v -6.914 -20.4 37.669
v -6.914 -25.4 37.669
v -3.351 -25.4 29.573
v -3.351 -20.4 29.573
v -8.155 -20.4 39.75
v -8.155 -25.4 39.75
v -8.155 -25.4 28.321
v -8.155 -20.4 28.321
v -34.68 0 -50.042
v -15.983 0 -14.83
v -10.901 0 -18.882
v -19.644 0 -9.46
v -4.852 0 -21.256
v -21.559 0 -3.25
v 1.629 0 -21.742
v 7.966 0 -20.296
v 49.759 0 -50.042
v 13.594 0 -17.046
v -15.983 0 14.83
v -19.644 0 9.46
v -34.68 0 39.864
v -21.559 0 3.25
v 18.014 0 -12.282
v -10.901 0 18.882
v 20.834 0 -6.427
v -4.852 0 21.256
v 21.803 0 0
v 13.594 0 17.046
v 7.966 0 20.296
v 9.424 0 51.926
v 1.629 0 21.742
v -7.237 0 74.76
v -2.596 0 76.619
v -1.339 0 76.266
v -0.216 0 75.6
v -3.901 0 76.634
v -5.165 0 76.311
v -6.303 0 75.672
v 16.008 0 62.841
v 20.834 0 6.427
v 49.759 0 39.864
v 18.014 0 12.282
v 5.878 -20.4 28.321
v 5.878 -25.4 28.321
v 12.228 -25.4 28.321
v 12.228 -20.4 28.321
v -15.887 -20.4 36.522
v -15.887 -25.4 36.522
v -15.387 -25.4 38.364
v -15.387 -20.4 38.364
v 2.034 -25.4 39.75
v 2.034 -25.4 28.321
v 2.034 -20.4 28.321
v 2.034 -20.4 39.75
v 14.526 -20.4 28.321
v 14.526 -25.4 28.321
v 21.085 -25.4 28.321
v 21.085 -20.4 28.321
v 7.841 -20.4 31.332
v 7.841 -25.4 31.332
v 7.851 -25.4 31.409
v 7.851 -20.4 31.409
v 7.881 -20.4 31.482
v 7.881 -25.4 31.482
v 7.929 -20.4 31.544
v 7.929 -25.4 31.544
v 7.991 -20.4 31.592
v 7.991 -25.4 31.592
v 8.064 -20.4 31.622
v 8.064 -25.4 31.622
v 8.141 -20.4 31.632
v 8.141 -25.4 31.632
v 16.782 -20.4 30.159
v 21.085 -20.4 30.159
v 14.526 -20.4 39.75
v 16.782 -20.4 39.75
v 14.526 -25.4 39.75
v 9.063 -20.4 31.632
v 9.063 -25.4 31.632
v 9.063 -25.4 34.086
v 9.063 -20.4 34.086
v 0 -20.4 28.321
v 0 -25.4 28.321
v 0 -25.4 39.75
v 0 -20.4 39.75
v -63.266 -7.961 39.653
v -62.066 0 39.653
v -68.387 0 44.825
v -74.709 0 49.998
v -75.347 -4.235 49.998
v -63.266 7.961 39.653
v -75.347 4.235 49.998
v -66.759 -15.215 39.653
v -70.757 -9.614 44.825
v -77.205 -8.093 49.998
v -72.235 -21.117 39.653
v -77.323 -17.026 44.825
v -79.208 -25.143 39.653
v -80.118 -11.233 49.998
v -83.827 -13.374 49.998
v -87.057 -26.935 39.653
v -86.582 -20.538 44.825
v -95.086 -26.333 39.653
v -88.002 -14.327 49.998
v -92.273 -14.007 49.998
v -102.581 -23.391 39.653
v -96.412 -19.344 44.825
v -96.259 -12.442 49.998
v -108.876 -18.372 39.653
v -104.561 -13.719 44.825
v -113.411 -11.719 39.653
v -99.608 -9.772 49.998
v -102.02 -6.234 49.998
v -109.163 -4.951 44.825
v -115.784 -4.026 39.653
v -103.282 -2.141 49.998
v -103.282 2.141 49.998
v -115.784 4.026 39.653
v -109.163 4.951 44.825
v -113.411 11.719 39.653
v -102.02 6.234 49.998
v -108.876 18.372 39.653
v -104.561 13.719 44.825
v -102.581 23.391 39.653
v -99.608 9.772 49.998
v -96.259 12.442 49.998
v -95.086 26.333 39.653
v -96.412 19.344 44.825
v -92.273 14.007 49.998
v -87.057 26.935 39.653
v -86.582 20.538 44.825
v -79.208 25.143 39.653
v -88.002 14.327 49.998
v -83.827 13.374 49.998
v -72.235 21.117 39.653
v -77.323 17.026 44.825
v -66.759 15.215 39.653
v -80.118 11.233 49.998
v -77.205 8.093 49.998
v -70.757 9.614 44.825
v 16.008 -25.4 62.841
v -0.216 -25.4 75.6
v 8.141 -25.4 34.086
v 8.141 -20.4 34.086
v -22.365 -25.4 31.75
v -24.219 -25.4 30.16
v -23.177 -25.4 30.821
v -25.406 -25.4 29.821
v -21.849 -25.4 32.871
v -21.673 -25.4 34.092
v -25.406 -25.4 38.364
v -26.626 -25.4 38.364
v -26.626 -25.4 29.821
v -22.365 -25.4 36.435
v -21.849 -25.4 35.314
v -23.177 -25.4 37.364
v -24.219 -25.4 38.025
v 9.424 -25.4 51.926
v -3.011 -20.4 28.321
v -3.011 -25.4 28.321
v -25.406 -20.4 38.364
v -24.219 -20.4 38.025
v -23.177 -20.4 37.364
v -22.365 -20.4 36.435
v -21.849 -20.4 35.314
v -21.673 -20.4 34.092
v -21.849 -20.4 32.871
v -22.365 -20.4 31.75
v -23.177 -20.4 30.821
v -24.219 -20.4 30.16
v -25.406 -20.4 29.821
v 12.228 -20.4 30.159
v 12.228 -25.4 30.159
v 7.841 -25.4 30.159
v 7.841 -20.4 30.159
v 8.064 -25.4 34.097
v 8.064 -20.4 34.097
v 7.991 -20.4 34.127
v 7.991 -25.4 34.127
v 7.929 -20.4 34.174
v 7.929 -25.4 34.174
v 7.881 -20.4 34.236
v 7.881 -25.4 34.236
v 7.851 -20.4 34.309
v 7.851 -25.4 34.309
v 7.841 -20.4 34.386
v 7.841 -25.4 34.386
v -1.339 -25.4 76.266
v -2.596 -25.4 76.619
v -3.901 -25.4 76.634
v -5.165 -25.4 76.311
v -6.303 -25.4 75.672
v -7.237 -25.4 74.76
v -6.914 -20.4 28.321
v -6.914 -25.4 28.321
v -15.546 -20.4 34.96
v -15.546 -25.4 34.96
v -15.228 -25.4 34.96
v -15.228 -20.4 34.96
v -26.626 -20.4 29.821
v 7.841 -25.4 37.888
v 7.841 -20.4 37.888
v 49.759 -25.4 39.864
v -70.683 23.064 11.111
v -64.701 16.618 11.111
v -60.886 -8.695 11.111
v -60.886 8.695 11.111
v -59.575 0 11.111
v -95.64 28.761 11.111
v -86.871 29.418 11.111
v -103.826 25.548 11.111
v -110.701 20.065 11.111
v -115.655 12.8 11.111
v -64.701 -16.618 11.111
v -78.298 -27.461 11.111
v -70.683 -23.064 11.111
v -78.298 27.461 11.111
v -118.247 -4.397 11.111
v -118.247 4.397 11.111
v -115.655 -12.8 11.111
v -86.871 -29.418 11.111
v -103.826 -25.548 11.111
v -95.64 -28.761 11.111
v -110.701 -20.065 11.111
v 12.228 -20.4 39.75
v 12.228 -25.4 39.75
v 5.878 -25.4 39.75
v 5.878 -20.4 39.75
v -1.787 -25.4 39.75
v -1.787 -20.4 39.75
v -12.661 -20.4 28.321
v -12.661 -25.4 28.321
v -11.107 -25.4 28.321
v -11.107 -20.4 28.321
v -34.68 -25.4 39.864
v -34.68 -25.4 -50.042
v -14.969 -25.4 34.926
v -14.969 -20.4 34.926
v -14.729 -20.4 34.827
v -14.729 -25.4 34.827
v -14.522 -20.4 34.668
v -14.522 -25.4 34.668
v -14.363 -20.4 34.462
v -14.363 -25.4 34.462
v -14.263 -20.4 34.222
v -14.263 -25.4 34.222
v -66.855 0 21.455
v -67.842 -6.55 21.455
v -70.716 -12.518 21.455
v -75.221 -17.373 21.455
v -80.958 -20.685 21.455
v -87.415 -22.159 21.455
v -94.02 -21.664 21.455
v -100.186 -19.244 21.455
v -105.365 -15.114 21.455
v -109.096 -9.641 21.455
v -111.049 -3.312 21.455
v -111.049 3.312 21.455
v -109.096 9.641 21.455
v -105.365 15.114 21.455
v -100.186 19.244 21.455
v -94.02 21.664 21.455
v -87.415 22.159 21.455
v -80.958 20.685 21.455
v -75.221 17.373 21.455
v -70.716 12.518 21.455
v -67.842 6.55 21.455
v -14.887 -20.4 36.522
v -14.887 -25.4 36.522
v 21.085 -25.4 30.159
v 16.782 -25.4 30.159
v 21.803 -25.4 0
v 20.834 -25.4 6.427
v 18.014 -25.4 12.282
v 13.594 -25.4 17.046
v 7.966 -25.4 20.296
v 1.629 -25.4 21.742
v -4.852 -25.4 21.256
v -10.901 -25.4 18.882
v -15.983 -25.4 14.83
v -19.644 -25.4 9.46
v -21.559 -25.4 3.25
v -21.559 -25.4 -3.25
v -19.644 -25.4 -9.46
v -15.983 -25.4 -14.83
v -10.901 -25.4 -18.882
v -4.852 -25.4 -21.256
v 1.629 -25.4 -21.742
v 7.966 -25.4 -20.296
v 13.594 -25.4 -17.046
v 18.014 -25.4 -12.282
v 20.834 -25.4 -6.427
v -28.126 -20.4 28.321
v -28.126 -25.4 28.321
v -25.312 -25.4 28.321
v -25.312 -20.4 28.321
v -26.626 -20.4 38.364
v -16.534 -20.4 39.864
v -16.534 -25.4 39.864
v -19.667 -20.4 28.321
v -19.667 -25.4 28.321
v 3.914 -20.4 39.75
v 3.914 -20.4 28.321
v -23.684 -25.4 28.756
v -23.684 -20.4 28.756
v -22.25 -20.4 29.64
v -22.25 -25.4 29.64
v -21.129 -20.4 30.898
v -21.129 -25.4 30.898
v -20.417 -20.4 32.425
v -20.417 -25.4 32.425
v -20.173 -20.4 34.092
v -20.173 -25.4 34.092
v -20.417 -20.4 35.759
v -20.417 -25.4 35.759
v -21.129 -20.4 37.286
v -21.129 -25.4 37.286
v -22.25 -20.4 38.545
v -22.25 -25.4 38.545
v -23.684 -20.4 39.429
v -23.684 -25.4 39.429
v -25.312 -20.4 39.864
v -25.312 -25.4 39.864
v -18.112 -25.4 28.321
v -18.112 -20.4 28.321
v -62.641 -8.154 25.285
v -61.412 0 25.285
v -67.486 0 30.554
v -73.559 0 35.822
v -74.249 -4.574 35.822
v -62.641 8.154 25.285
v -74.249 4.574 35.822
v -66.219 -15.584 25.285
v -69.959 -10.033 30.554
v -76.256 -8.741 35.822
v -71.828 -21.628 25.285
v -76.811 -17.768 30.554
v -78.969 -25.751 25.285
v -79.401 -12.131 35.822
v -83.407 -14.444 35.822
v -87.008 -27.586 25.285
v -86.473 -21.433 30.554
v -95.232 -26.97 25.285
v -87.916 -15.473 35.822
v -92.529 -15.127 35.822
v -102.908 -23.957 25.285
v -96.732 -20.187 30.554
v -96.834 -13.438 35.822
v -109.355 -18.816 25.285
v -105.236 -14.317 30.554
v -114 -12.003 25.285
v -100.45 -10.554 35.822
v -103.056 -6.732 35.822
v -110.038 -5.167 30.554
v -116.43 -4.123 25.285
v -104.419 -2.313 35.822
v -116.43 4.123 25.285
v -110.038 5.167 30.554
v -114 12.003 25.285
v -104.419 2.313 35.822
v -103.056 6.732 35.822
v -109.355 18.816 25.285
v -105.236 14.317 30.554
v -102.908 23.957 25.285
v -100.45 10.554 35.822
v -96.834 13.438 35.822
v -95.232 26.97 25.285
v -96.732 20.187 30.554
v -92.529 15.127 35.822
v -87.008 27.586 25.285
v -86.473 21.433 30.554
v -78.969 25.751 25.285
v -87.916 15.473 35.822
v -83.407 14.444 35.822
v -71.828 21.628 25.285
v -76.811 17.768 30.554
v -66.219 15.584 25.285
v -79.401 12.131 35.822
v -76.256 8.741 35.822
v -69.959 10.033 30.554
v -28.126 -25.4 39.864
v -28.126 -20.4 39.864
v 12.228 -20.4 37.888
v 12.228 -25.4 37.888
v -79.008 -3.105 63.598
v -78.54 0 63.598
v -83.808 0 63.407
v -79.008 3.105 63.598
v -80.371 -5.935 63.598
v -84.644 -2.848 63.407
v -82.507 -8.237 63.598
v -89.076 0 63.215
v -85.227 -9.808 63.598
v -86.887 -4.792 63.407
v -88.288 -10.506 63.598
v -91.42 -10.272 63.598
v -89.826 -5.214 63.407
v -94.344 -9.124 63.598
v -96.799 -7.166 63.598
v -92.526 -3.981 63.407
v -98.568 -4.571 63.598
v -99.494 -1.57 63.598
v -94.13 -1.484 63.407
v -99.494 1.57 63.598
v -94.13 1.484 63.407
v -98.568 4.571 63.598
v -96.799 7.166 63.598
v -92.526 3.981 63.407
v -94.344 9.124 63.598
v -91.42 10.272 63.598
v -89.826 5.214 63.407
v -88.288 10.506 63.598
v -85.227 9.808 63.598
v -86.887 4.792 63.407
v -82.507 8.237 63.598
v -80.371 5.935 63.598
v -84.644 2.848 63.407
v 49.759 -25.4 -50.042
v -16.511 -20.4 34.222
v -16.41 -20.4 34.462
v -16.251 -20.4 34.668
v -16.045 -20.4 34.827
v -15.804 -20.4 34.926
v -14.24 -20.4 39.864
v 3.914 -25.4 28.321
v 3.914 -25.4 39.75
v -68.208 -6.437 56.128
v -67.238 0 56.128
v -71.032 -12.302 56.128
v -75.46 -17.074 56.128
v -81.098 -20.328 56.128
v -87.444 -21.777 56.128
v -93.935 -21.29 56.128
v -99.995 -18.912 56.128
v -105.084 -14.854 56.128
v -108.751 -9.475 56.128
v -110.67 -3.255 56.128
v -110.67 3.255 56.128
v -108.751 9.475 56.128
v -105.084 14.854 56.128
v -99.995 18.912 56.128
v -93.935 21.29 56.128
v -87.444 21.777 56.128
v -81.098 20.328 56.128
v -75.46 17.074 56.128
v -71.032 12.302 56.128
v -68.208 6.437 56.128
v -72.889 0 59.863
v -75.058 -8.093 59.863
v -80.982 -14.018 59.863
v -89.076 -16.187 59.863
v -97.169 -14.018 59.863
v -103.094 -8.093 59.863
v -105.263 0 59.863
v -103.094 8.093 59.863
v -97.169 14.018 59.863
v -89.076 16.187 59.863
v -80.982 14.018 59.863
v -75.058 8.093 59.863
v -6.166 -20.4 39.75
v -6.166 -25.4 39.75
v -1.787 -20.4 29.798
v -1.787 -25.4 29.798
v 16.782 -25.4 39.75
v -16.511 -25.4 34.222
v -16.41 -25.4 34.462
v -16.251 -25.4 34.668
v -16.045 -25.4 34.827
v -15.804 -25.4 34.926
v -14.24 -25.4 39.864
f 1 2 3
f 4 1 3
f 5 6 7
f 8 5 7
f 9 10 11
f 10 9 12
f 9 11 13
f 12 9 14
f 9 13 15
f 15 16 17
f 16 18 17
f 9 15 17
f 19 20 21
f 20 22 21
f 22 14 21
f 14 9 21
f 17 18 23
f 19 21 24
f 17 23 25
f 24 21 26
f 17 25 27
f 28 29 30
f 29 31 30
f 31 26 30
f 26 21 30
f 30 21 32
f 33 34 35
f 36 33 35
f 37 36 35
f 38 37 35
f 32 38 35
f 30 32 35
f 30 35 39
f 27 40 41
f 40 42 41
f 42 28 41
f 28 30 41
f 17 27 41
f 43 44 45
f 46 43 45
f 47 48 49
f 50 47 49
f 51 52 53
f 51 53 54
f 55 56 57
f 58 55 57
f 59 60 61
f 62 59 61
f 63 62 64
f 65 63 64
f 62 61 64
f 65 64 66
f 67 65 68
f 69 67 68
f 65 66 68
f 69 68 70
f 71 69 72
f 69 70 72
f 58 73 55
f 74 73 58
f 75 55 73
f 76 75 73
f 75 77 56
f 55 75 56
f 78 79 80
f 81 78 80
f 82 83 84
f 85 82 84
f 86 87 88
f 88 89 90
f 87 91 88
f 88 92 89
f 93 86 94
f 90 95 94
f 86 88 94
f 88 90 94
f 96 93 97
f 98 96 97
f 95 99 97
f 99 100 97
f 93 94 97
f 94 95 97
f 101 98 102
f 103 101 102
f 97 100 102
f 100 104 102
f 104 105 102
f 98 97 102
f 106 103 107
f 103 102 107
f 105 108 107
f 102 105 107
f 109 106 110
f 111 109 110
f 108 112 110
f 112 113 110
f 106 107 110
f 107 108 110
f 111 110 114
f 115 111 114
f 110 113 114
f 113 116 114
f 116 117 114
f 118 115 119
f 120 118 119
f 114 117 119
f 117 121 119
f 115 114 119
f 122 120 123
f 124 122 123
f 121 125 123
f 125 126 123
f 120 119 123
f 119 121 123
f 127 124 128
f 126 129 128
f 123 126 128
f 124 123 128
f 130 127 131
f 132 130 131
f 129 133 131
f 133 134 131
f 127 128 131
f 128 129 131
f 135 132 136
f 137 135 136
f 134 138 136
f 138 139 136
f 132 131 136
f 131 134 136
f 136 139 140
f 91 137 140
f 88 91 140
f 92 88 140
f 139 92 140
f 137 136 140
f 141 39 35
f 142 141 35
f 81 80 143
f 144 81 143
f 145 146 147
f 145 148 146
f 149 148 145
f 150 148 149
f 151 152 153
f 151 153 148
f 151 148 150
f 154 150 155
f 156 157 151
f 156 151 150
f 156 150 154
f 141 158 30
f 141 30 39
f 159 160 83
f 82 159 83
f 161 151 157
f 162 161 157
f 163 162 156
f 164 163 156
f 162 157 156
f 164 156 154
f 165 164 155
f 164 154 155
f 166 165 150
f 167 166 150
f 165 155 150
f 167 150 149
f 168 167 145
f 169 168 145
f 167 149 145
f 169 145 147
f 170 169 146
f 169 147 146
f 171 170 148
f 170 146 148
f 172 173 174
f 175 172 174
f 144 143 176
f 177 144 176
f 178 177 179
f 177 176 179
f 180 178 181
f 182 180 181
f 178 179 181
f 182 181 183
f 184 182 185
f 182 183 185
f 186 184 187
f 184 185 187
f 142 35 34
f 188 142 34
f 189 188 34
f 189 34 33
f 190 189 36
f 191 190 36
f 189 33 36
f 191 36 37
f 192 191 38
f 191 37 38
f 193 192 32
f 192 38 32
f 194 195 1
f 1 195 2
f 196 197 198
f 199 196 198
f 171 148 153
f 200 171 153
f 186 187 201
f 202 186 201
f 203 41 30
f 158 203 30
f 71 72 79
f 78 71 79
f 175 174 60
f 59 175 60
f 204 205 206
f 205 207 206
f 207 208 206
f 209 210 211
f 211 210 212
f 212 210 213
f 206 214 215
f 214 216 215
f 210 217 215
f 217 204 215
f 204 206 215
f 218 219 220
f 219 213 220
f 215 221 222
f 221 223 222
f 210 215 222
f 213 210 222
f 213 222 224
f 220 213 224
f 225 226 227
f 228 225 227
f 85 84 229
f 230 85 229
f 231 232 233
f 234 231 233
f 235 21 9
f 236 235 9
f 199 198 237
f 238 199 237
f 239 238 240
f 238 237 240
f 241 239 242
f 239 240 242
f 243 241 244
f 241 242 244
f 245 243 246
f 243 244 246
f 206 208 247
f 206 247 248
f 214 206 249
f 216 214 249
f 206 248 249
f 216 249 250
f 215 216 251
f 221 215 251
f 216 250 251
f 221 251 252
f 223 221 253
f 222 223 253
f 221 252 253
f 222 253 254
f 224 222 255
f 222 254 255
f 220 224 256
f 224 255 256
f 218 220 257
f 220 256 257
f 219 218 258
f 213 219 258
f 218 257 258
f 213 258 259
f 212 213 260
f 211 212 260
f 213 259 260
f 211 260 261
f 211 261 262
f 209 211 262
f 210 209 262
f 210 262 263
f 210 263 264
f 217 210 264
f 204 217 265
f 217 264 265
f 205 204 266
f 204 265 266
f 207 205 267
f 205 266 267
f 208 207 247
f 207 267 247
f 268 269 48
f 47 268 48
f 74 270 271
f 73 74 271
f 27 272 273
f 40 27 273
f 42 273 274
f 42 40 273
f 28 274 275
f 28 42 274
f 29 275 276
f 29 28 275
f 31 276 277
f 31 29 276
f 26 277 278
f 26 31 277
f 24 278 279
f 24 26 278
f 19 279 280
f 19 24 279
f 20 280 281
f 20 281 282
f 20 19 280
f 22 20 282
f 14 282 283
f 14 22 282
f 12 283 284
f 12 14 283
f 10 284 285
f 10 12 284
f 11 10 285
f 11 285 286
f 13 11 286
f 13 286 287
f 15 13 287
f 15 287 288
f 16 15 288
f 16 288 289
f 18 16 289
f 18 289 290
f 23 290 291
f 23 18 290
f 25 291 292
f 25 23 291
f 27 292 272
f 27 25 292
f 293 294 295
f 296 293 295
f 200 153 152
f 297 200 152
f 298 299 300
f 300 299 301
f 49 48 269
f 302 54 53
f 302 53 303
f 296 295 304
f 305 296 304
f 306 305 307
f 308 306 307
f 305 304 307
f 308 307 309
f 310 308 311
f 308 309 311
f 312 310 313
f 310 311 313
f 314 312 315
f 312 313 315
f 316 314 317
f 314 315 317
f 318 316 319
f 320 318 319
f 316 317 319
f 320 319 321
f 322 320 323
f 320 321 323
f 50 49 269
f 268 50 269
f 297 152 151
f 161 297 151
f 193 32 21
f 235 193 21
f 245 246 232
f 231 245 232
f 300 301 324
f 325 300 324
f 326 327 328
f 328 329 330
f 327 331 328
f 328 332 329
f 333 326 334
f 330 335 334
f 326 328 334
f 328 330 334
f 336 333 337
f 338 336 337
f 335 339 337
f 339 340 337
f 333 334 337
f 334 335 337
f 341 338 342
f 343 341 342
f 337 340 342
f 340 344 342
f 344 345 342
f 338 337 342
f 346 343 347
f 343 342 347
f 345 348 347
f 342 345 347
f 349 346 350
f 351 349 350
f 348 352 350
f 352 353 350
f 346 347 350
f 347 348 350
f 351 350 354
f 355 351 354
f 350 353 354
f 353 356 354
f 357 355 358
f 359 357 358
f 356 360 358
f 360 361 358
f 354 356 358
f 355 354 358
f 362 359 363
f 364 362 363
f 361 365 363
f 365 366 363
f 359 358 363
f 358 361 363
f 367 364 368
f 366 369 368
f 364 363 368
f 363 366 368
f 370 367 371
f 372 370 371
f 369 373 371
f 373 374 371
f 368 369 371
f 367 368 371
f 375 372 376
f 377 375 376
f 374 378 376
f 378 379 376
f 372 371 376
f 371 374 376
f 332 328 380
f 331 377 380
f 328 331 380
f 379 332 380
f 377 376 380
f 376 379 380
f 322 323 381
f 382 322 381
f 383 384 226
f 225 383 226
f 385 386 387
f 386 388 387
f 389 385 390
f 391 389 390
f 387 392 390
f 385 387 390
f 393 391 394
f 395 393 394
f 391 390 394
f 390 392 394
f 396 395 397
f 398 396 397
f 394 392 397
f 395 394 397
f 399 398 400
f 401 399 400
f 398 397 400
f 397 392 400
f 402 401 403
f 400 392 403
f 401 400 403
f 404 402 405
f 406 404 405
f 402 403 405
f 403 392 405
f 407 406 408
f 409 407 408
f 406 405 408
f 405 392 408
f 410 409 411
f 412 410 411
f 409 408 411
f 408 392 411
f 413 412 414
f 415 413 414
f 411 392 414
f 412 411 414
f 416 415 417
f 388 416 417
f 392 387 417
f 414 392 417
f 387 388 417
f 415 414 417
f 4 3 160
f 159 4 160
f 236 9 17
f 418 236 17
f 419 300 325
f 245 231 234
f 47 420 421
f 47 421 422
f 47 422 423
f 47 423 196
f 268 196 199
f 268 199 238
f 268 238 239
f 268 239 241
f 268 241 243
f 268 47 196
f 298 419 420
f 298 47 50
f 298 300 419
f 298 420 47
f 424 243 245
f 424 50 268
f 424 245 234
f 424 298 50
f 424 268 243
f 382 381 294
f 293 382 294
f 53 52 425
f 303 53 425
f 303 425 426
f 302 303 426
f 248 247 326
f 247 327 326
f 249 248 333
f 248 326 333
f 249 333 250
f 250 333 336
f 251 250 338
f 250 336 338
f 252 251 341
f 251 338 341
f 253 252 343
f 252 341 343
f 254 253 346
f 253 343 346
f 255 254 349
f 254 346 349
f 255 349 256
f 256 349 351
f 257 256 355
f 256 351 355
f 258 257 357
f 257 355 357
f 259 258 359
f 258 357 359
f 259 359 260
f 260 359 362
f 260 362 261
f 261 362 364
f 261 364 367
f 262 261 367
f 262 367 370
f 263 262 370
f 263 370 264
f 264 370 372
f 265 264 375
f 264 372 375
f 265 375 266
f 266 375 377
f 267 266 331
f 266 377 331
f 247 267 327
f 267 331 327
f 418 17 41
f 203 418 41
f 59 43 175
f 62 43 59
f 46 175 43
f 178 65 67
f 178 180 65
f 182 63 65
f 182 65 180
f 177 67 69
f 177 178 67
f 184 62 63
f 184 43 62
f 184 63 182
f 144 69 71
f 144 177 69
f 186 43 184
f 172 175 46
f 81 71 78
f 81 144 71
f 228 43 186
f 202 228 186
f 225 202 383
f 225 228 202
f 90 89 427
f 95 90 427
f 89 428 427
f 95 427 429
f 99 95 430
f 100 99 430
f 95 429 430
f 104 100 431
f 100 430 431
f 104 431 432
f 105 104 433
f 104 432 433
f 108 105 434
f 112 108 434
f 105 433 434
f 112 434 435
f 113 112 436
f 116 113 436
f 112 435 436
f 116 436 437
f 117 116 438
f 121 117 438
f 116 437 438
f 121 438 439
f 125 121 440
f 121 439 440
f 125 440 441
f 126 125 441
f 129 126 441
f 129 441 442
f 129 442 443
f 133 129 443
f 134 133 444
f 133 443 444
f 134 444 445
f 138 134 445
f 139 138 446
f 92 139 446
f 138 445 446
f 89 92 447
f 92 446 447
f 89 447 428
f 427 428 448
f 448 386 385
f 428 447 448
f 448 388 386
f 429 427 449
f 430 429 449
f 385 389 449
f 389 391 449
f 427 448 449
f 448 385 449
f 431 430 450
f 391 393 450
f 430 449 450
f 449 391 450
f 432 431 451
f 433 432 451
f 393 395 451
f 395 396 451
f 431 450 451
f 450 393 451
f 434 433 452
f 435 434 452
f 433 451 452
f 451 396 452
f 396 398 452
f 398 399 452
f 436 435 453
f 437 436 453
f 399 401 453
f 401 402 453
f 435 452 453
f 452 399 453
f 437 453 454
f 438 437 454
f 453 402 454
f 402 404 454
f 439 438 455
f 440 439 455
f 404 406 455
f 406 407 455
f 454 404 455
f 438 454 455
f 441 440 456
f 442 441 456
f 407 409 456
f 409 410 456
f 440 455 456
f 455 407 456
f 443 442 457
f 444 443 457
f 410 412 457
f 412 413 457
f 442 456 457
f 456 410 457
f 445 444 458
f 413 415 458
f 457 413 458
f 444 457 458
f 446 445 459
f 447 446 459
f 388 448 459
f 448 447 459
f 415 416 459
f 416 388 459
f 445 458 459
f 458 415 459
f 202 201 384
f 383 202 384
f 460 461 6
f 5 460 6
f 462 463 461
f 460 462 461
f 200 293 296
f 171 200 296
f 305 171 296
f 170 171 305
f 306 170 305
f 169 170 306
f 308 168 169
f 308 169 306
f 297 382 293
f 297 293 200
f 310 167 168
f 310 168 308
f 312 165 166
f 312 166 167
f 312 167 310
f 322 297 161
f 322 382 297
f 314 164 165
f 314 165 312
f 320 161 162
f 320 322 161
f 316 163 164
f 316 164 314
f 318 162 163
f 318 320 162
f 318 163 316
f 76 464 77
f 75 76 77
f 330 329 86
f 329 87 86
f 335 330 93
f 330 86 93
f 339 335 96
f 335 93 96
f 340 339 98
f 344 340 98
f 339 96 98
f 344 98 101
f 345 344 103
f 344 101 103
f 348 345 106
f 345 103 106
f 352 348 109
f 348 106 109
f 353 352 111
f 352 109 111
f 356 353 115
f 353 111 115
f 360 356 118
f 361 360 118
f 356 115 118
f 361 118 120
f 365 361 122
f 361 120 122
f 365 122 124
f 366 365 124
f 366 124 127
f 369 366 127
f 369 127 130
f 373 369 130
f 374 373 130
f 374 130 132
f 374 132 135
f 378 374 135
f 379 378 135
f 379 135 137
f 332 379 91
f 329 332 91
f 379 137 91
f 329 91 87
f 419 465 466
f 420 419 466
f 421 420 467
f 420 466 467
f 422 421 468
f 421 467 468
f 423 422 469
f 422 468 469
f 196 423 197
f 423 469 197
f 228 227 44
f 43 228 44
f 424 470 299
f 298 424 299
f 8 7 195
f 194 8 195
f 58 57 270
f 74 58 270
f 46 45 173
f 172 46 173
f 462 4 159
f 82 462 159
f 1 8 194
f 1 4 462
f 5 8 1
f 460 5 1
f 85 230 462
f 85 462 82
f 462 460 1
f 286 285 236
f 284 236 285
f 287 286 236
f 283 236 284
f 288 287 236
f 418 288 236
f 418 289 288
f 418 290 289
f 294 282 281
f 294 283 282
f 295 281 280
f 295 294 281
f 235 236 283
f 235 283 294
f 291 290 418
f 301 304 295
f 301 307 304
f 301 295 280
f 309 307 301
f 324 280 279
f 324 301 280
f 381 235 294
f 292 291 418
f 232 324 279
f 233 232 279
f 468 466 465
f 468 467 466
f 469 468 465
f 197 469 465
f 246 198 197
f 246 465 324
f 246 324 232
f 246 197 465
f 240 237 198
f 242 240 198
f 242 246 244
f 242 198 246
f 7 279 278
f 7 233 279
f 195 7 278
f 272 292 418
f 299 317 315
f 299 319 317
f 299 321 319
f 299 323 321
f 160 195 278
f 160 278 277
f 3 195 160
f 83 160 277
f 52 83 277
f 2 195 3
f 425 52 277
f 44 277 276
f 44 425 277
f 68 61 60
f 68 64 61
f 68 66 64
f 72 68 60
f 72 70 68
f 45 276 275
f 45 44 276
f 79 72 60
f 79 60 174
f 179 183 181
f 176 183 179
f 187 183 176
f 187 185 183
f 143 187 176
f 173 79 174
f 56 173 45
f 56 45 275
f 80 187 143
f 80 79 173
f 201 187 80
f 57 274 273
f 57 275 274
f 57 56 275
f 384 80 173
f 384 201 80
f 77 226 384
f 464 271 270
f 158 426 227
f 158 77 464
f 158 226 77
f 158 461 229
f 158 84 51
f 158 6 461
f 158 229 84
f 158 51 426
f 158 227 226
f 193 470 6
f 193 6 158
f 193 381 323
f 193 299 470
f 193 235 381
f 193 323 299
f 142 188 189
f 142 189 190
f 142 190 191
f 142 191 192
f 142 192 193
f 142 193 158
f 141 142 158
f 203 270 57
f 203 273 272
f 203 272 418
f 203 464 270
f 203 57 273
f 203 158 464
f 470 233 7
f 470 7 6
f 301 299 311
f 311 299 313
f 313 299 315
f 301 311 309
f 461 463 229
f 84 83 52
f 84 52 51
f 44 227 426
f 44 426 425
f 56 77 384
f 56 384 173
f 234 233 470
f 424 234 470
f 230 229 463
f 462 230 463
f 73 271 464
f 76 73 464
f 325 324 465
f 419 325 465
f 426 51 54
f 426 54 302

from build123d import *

# Parameters (mm, degrees)
F0_R     = 21.802932
F1_DEPTH = 25.4
F4_W     = 1.879983
F4_H     = 11.429243
F5_DEPTH = 5


with BuildPart() as f1:
    # F0 (on Front) → F1 (new body)
    with BuildSketch(Plane.XZ):
        with BuildLine():
            Line((-34.680426, 39.863642), (-34.680426, -50.04159))
            Line((-34.680426, -50.04159), (49.758866, -50.04159))
            Line((49.758866, -50.04159), (49.758866, 39.863642))
            Line((49.758866, 39.863642), (9.42403, 51.926393))
            Line((9.42403, 51.926393), (16.007511, 62.841313))
            Line((16.007511, 62.841313), (-0.216304, 75.599848))
            ThreePointArc((-0.216304, 75.599848), (-3.900695, 76.63422), (-7.237364, 74.760373))
            Line((-7.237364, 74.760373), (-34.680426, 39.863642))
        make_face()
        Circle(F0_R, mode=Mode.SUBTRACT)
    extrude(amount=F1_DEPTH)

    # F4 (on face) → F5 (cut)
    with BuildSketch(Plane.XZ.offset(25.4)):
        with BuildLine():
            Line((-25.312183, 39.863642), (-28.125796, 39.863642))
            Line((-28.125796, 39.863642), (-28.125796, 28.321173))
            Line((-28.125796, 28.321173), (-25.312183, 28.321173))
            ThreePointArc((-25.312183, 28.321173), (-20.172784, 34.092408), (-25.312183, 39.863642))
        make_face()
        with BuildLine():
            ThreePointArc((-25.405546, 38.363642), (-21.672784, 34.092408), (-25.405546, 29.821173))
            Line((-25.405546, 29.821173), (-26.625796, 29.821173))
            Line((-26.625796, 29.821173), (-26.625796, 38.363642))
            Line((-26.625796, 38.363642), (-25.405546, 38.363642))
        make_face(mode=Mode.SUBTRACT)
        with BuildLine():
            Line((-14.239507, 39.863642), (-16.533819, 39.863642))
            Line((-16.533819, 39.863642), (-19.666507, 28.321173))
            Line((-19.666507, 28.321173), (-18.112243, 28.321173))
            Line((-18.112243, 28.321173), (-16.510762, 34.221871))
            ThreePointArc((-16.510762, 34.221871), (-16.153157, 34.754275), (-15.545675, 34.959942))
            Line((-15.545675, 34.959942), (-15.386663, 34.959942))
            Line((-15.386663, 34.959942), (-15.22765, 34.959942))
            ThreePointArc((-15.22765, 34.959942), (-14.620168, 34.754275), (-14.262563, 34.221871))
            Line((-14.262563, 34.221871), (-12.661082, 28.321173))
            Line((-12.661082, 28.321173), (-11.106818, 28.321173))
            Line((-11.106818, 28.321173), (-14.239507, 39.863642))
        make_face()
        Polygon((-14.8867, 36.521517), (-15.386663, 36.521517), (-15.886625, 36.521517), (-15.386663, 38.363642), align=None, mode=Mode.SUBTRACT)
        with Locations((2.97413, 34.035795)):
            Rectangle(F4_W, F4_H)
        with BuildLine():
            Line((12.227822, 39.750416), (5.877659, 39.750416))
            Line((5.877659, 39.750416), (5.877659, 28.321173))
            Line((5.877659, 28.321173), (12.227822, 28.321173))
            Line((12.227822, 28.321173), (12.227822, 30.159378))
            Line((12.227822, 30.159378), (7.841197, 30.159378))
            Line((7.841197, 30.159378), (7.841197, 31.331802))
            ThreePointArc((7.841197, 31.331802), (7.929065, 31.543934), (8.141197, 31.631802))
            Line((8.141197, 31.631802), (9.062956, 31.631802))
            Line((9.062956, 31.631802), (9.062956, 34.086451))
            Line((9.062956, 34.086451), (8.141197, 34.086451))
            ThreePointArc((8.141197, 34.086451), (7.929065, 34.174319), (7.841197, 34.386451))
            Line((7.841197, 34.386451), (7.841197, 37.888195))
            Line((7.841197, 37.888195), (12.227822, 37.888195))
            Line((12.227822, 37.888195), (12.227822, 39.750416))
        make_face()
        Polygon((16.781555, 39.750416), (14.525576, 39.750416), (14.525576, 28.321173), (21.084625, 28.321173), (21.084625, 30.159378), (16.781555, 30.159378), align=None)
        Polygon((-8.154768, 39.750416), (-8.154768, 28.321173), (-6.913761, 28.321173), (-6.913761, 37.668776), (-3.351229, 29.57325), (-3.011408, 28.321173), (0, 28.321173), (0, 39.750416), (-1.786575, 39.750416), (-1.786575, 29.798029), (-6.16624, 39.750416), align=None)
    extrude(amount=-F5_DEPTH, mode=Mode.SUBTRACT)


with BuildPart() as f3:
    # F2 (on Front) → F3 (revolve)
    with BuildSketch(Plane.XZ):
        Polygon((-78.539953, 63.598379), (-89.075804, 63.215263), (-89.075804, 11.110704), (-59.575427, 11.110704), (-66.854745, 21.45499), (-61.41213, 25.284981), (-73.559374, 35.822056), (-62.065721, 39.653271), (-74.708737, 49.997561), (-67.237861, 56.127507), align=None)
    revolve(axis=Axis((-89.075804, 0, 37.162984), (0, 0, -1)))


solid = Compound([f1.part, f3.part])
